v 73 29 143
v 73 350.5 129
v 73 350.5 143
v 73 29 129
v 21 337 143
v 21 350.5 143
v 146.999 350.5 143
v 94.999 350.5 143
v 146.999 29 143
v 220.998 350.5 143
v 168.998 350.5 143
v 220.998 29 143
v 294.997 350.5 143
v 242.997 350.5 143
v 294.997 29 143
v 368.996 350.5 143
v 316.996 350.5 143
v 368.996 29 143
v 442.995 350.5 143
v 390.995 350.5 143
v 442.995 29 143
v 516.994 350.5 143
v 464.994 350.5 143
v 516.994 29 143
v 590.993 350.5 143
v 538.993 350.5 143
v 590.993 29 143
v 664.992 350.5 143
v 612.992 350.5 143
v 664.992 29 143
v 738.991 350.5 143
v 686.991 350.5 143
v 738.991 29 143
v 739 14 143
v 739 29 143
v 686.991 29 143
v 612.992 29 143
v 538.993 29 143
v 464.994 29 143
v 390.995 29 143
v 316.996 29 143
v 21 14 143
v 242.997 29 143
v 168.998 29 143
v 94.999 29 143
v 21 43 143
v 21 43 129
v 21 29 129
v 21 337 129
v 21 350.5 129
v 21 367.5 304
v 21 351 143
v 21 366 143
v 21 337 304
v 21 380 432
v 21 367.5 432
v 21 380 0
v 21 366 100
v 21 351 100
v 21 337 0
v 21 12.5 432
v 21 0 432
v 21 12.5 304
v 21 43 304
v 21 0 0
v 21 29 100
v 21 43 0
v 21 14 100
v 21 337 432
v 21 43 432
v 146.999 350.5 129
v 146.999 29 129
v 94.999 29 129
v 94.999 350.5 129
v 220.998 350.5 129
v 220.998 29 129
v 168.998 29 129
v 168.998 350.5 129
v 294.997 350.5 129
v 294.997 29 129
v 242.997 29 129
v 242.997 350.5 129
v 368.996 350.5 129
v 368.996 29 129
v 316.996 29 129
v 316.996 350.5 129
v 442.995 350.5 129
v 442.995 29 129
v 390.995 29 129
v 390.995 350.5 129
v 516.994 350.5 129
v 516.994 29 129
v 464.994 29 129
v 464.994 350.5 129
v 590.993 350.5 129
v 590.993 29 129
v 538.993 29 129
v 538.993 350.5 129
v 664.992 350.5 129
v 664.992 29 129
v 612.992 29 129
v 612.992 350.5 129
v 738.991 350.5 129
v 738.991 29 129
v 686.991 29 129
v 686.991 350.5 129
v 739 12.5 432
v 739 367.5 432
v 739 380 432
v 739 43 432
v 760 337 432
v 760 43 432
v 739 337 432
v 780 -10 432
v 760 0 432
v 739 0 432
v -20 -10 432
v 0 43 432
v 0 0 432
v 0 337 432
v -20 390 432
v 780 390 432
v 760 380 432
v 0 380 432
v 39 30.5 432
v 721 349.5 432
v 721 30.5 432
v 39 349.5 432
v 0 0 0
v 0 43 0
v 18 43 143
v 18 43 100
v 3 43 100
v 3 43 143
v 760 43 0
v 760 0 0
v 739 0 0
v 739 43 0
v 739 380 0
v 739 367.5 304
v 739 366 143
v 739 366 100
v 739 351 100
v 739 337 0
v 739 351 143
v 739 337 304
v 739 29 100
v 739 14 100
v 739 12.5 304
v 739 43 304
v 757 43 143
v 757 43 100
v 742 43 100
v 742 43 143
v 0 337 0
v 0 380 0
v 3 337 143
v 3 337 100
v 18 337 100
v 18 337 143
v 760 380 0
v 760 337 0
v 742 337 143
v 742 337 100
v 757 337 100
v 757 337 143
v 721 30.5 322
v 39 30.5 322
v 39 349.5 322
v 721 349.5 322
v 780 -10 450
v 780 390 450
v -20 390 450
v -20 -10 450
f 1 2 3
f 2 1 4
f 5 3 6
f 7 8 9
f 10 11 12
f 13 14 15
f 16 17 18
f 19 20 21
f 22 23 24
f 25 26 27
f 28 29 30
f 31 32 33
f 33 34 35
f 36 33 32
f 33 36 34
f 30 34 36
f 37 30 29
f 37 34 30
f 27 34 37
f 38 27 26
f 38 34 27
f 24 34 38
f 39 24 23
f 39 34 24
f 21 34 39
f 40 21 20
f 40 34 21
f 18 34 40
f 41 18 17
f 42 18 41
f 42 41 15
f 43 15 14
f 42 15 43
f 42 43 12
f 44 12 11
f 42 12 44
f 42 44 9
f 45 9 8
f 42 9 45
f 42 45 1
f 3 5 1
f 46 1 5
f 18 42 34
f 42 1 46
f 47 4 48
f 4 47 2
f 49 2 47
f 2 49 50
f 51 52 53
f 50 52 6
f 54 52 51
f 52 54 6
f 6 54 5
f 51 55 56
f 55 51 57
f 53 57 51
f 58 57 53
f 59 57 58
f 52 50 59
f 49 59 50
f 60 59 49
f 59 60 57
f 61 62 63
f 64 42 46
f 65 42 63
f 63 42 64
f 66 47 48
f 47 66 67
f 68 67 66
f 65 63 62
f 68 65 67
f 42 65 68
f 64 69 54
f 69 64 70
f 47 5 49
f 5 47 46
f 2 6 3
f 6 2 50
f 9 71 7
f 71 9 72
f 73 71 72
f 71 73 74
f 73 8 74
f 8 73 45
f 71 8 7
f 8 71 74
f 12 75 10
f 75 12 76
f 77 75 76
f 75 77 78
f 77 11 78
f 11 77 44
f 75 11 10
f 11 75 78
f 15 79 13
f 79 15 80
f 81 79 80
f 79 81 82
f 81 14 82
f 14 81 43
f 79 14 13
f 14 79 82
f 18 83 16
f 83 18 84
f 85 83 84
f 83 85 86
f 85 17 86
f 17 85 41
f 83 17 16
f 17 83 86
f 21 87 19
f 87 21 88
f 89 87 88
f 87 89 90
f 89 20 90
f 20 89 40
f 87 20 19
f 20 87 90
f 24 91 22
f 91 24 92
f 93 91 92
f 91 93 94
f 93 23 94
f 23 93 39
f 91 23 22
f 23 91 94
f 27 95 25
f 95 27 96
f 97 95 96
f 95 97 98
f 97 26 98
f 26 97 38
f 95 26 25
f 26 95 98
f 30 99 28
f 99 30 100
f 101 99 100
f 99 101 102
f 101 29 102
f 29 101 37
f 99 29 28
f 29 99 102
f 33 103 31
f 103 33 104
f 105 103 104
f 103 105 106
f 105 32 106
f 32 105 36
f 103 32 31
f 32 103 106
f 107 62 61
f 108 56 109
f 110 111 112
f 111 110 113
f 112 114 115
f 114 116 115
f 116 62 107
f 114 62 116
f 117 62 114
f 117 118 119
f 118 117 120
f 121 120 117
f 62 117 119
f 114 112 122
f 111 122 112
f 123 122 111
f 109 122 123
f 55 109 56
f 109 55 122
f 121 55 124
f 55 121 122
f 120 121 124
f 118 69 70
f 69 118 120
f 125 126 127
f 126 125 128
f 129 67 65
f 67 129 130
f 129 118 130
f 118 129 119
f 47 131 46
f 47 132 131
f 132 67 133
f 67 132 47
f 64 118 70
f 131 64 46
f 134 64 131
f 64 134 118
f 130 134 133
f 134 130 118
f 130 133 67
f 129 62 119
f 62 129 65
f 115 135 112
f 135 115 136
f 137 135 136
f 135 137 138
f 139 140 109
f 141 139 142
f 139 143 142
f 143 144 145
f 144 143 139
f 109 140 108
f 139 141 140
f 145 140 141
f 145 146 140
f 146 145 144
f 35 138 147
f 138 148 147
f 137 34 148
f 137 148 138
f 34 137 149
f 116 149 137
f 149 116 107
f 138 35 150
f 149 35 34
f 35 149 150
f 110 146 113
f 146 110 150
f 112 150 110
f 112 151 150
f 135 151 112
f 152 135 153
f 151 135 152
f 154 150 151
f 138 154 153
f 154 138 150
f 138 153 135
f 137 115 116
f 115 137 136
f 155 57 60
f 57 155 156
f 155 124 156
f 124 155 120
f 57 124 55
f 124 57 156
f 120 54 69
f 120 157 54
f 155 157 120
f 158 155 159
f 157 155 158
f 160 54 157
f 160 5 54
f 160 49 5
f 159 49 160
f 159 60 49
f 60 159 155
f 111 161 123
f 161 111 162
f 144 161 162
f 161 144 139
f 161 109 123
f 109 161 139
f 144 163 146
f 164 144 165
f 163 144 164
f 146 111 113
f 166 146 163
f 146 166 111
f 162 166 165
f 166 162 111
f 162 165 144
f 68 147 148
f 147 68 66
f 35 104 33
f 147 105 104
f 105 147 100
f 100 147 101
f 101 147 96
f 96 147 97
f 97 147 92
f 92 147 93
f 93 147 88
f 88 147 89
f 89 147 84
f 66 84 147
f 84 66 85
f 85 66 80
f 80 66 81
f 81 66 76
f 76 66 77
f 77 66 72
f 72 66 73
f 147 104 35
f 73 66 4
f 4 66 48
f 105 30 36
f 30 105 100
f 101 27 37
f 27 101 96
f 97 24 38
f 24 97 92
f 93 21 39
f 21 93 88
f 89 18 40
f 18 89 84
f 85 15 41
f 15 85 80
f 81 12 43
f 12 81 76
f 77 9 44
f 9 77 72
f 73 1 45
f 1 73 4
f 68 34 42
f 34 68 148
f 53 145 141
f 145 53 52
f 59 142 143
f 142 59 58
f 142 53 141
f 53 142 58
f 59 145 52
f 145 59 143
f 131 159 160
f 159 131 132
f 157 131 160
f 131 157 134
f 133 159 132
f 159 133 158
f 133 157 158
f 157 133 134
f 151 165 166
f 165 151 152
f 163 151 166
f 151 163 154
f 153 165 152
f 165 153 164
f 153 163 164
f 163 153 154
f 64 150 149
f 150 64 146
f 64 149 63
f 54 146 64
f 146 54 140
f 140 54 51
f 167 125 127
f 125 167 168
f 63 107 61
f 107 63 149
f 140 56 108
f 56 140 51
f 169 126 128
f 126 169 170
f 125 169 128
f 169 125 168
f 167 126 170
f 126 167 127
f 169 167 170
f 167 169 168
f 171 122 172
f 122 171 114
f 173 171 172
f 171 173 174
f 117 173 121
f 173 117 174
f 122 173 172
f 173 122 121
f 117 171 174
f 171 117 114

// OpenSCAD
/*
    Shoe Shelf
    by Anton Augustsson
*/

// not final daimension
totalLenght = 800;
totalWidth  = 400;
totalHight  = 450;
lidExtraLenghtOnEachSide = 20;
lidExtraWidthOnEachSide  = 10;
teakPlyThickness  = 18;
teakPlyThickness2 = 14;
listThickness     = 15;
listWidth         = 43;
smallNumber       = 0.001;

// Leg
legThickness  =  21;//listThickness*2;
legLenght     =  totalHight-teakPlyThickness;
legWidth      =  listWidth;

// Shelf
shelfLenght   = totalLenght
    -(legThickness*2+lidExtraLenghtOnEachSide*2);
shelfHeight   = 100;
shelfWidth    = totalWidth
    -(legWidth*2+lidExtraWidthOnEachSide*2);

// Studs 
studsAmount = 10;
studsLenght = shelfWidth+
    listWidth-listThickness;
studsWidth  = 52;
studIncrese = 
    (shelfLenght-studsAmount*studsWidth)
    /(studsAmount-1)
    +studsWidth
    -smallNumber;
    
// Storage    
storageLenght = shelfLenght;
storageDepth  = 110+teakPlyThickness;
storageHeight = legLenght-storageDepth;
storageWidth  = shelfWidth+
    listWidth-teakPlyThickness;
storageBottomLenght = storageLenght
    -teakPlyThickness*2;

lidLenght = totalLenght;  
lidWidth  = totalWidth;


// --------------- Code ---------------
color("Wheat")
union () {
// leg 1
translate([
    0,
    0,
    0]) 
    cube(size = [
    legThickness,
    legWidth,
    legLenght]);
    
// leg 2
translate([
    storageLenght+legThickness,
    0,
    0]) 
    cube(size = [
    legThickness,
    legWidth,
    legLenght]);
    
// leg 3
translate([
    0,
    shelfWidth+legWidth,
    0]) 
    cube(size = [
    legThickness,
    legWidth,
    legLenght]);
    
// leg 4
translate([
    storageLenght+legThickness,
    shelfWidth+legWidth,
    0]) 
    cube(size = [
    legThickness,
    legWidth,
    legLenght]);
    
    
// shelfStabaliserFront

translate([
    legThickness,
    listWidth/2-listThickness/2,
    shelfHeight]) 
    cube(size = [
    shelfLenght,
    listThickness,
    listWidth]);
    
// shelfStabaliserBack
translate([
    legThickness,
    listWidth/2-listThickness/2
    +shelfWidth+legWidth,
    shelfHeight]) 
    cube(size = [
    shelfLenght,
    listThickness,
    listWidth]);
    
// shelfStabaliserLeft
translate([
    legThickness/2-listThickness/2,
    listWidth,
    shelfHeight]) 
    cube(size = [
    listThickness,
    shelfWidth,
    listWidth]);
    
// shelfStabaliserRight
translate([
    storageLenght+legThickness
    +legThickness/2-listThickness/2,
    listWidth,
    shelfHeight]) 
    cube(size = [
    listThickness,
    shelfWidth,
    listWidth]);
    
// shelfLists  
for(i = [
    legThickness:
    studIncrese: 
    legThickness+shelfLenght
    -studsWidth])
    translate([
        i,
        listWidth/2+teakPlyThickness2/2,
        shelfHeight+listWidth-teakPlyThickness2]) 
        cube(size = [
        studsWidth,
        studsLenght,
        teakPlyThickness2]);
}

color("Tan")
union () {
// storageFront
translate([
    legThickness,
    listWidth/2-teakPlyThickness/2,
    storageHeight]) 
    cube(size = [
    storageLenght,
    teakPlyThickness,
    storageDepth]);

// storageBack
translate([
    legThickness,
    listWidth/2-teakPlyThickness/2
    +shelfWidth+legWidth,
    storageHeight]) 
    cube(size = [
    storageLenght,
    teakPlyThickness,
    storageDepth]);
    
// storageRight
translate([
    legThickness,
    listWidth/2+teakPlyThickness/2,
    storageHeight]) 
    cube(size = [
    teakPlyThickness,
    storageWidth,
    storageDepth]);
    
// storageLeft
translate([
    legThickness+storageLenght-teakPlyThickness,
    listWidth/2+teakPlyThickness/2,
    storageHeight]) 
    cube(size = [
    teakPlyThickness,
    storageWidth,
    storageDepth]);
    
// storageBottom
translate([
    legThickness+teakPlyThickness,
    listWidth/2+teakPlyThickness/2,
    storageHeight]) 
    cube(size = [
    storageBottomLenght,
    storageWidth,
    teakPlyThickness]);
}

color("Wheat")
union () {
// lid
translate([
    -lidExtraLenghtOnEachSide,
    -lidExtraWidthOnEachSide,
    storageHeight+storageDepth])
    cube(size = [
    lidLenght,
    lidWidth,
    teakPlyThickness]);
}
